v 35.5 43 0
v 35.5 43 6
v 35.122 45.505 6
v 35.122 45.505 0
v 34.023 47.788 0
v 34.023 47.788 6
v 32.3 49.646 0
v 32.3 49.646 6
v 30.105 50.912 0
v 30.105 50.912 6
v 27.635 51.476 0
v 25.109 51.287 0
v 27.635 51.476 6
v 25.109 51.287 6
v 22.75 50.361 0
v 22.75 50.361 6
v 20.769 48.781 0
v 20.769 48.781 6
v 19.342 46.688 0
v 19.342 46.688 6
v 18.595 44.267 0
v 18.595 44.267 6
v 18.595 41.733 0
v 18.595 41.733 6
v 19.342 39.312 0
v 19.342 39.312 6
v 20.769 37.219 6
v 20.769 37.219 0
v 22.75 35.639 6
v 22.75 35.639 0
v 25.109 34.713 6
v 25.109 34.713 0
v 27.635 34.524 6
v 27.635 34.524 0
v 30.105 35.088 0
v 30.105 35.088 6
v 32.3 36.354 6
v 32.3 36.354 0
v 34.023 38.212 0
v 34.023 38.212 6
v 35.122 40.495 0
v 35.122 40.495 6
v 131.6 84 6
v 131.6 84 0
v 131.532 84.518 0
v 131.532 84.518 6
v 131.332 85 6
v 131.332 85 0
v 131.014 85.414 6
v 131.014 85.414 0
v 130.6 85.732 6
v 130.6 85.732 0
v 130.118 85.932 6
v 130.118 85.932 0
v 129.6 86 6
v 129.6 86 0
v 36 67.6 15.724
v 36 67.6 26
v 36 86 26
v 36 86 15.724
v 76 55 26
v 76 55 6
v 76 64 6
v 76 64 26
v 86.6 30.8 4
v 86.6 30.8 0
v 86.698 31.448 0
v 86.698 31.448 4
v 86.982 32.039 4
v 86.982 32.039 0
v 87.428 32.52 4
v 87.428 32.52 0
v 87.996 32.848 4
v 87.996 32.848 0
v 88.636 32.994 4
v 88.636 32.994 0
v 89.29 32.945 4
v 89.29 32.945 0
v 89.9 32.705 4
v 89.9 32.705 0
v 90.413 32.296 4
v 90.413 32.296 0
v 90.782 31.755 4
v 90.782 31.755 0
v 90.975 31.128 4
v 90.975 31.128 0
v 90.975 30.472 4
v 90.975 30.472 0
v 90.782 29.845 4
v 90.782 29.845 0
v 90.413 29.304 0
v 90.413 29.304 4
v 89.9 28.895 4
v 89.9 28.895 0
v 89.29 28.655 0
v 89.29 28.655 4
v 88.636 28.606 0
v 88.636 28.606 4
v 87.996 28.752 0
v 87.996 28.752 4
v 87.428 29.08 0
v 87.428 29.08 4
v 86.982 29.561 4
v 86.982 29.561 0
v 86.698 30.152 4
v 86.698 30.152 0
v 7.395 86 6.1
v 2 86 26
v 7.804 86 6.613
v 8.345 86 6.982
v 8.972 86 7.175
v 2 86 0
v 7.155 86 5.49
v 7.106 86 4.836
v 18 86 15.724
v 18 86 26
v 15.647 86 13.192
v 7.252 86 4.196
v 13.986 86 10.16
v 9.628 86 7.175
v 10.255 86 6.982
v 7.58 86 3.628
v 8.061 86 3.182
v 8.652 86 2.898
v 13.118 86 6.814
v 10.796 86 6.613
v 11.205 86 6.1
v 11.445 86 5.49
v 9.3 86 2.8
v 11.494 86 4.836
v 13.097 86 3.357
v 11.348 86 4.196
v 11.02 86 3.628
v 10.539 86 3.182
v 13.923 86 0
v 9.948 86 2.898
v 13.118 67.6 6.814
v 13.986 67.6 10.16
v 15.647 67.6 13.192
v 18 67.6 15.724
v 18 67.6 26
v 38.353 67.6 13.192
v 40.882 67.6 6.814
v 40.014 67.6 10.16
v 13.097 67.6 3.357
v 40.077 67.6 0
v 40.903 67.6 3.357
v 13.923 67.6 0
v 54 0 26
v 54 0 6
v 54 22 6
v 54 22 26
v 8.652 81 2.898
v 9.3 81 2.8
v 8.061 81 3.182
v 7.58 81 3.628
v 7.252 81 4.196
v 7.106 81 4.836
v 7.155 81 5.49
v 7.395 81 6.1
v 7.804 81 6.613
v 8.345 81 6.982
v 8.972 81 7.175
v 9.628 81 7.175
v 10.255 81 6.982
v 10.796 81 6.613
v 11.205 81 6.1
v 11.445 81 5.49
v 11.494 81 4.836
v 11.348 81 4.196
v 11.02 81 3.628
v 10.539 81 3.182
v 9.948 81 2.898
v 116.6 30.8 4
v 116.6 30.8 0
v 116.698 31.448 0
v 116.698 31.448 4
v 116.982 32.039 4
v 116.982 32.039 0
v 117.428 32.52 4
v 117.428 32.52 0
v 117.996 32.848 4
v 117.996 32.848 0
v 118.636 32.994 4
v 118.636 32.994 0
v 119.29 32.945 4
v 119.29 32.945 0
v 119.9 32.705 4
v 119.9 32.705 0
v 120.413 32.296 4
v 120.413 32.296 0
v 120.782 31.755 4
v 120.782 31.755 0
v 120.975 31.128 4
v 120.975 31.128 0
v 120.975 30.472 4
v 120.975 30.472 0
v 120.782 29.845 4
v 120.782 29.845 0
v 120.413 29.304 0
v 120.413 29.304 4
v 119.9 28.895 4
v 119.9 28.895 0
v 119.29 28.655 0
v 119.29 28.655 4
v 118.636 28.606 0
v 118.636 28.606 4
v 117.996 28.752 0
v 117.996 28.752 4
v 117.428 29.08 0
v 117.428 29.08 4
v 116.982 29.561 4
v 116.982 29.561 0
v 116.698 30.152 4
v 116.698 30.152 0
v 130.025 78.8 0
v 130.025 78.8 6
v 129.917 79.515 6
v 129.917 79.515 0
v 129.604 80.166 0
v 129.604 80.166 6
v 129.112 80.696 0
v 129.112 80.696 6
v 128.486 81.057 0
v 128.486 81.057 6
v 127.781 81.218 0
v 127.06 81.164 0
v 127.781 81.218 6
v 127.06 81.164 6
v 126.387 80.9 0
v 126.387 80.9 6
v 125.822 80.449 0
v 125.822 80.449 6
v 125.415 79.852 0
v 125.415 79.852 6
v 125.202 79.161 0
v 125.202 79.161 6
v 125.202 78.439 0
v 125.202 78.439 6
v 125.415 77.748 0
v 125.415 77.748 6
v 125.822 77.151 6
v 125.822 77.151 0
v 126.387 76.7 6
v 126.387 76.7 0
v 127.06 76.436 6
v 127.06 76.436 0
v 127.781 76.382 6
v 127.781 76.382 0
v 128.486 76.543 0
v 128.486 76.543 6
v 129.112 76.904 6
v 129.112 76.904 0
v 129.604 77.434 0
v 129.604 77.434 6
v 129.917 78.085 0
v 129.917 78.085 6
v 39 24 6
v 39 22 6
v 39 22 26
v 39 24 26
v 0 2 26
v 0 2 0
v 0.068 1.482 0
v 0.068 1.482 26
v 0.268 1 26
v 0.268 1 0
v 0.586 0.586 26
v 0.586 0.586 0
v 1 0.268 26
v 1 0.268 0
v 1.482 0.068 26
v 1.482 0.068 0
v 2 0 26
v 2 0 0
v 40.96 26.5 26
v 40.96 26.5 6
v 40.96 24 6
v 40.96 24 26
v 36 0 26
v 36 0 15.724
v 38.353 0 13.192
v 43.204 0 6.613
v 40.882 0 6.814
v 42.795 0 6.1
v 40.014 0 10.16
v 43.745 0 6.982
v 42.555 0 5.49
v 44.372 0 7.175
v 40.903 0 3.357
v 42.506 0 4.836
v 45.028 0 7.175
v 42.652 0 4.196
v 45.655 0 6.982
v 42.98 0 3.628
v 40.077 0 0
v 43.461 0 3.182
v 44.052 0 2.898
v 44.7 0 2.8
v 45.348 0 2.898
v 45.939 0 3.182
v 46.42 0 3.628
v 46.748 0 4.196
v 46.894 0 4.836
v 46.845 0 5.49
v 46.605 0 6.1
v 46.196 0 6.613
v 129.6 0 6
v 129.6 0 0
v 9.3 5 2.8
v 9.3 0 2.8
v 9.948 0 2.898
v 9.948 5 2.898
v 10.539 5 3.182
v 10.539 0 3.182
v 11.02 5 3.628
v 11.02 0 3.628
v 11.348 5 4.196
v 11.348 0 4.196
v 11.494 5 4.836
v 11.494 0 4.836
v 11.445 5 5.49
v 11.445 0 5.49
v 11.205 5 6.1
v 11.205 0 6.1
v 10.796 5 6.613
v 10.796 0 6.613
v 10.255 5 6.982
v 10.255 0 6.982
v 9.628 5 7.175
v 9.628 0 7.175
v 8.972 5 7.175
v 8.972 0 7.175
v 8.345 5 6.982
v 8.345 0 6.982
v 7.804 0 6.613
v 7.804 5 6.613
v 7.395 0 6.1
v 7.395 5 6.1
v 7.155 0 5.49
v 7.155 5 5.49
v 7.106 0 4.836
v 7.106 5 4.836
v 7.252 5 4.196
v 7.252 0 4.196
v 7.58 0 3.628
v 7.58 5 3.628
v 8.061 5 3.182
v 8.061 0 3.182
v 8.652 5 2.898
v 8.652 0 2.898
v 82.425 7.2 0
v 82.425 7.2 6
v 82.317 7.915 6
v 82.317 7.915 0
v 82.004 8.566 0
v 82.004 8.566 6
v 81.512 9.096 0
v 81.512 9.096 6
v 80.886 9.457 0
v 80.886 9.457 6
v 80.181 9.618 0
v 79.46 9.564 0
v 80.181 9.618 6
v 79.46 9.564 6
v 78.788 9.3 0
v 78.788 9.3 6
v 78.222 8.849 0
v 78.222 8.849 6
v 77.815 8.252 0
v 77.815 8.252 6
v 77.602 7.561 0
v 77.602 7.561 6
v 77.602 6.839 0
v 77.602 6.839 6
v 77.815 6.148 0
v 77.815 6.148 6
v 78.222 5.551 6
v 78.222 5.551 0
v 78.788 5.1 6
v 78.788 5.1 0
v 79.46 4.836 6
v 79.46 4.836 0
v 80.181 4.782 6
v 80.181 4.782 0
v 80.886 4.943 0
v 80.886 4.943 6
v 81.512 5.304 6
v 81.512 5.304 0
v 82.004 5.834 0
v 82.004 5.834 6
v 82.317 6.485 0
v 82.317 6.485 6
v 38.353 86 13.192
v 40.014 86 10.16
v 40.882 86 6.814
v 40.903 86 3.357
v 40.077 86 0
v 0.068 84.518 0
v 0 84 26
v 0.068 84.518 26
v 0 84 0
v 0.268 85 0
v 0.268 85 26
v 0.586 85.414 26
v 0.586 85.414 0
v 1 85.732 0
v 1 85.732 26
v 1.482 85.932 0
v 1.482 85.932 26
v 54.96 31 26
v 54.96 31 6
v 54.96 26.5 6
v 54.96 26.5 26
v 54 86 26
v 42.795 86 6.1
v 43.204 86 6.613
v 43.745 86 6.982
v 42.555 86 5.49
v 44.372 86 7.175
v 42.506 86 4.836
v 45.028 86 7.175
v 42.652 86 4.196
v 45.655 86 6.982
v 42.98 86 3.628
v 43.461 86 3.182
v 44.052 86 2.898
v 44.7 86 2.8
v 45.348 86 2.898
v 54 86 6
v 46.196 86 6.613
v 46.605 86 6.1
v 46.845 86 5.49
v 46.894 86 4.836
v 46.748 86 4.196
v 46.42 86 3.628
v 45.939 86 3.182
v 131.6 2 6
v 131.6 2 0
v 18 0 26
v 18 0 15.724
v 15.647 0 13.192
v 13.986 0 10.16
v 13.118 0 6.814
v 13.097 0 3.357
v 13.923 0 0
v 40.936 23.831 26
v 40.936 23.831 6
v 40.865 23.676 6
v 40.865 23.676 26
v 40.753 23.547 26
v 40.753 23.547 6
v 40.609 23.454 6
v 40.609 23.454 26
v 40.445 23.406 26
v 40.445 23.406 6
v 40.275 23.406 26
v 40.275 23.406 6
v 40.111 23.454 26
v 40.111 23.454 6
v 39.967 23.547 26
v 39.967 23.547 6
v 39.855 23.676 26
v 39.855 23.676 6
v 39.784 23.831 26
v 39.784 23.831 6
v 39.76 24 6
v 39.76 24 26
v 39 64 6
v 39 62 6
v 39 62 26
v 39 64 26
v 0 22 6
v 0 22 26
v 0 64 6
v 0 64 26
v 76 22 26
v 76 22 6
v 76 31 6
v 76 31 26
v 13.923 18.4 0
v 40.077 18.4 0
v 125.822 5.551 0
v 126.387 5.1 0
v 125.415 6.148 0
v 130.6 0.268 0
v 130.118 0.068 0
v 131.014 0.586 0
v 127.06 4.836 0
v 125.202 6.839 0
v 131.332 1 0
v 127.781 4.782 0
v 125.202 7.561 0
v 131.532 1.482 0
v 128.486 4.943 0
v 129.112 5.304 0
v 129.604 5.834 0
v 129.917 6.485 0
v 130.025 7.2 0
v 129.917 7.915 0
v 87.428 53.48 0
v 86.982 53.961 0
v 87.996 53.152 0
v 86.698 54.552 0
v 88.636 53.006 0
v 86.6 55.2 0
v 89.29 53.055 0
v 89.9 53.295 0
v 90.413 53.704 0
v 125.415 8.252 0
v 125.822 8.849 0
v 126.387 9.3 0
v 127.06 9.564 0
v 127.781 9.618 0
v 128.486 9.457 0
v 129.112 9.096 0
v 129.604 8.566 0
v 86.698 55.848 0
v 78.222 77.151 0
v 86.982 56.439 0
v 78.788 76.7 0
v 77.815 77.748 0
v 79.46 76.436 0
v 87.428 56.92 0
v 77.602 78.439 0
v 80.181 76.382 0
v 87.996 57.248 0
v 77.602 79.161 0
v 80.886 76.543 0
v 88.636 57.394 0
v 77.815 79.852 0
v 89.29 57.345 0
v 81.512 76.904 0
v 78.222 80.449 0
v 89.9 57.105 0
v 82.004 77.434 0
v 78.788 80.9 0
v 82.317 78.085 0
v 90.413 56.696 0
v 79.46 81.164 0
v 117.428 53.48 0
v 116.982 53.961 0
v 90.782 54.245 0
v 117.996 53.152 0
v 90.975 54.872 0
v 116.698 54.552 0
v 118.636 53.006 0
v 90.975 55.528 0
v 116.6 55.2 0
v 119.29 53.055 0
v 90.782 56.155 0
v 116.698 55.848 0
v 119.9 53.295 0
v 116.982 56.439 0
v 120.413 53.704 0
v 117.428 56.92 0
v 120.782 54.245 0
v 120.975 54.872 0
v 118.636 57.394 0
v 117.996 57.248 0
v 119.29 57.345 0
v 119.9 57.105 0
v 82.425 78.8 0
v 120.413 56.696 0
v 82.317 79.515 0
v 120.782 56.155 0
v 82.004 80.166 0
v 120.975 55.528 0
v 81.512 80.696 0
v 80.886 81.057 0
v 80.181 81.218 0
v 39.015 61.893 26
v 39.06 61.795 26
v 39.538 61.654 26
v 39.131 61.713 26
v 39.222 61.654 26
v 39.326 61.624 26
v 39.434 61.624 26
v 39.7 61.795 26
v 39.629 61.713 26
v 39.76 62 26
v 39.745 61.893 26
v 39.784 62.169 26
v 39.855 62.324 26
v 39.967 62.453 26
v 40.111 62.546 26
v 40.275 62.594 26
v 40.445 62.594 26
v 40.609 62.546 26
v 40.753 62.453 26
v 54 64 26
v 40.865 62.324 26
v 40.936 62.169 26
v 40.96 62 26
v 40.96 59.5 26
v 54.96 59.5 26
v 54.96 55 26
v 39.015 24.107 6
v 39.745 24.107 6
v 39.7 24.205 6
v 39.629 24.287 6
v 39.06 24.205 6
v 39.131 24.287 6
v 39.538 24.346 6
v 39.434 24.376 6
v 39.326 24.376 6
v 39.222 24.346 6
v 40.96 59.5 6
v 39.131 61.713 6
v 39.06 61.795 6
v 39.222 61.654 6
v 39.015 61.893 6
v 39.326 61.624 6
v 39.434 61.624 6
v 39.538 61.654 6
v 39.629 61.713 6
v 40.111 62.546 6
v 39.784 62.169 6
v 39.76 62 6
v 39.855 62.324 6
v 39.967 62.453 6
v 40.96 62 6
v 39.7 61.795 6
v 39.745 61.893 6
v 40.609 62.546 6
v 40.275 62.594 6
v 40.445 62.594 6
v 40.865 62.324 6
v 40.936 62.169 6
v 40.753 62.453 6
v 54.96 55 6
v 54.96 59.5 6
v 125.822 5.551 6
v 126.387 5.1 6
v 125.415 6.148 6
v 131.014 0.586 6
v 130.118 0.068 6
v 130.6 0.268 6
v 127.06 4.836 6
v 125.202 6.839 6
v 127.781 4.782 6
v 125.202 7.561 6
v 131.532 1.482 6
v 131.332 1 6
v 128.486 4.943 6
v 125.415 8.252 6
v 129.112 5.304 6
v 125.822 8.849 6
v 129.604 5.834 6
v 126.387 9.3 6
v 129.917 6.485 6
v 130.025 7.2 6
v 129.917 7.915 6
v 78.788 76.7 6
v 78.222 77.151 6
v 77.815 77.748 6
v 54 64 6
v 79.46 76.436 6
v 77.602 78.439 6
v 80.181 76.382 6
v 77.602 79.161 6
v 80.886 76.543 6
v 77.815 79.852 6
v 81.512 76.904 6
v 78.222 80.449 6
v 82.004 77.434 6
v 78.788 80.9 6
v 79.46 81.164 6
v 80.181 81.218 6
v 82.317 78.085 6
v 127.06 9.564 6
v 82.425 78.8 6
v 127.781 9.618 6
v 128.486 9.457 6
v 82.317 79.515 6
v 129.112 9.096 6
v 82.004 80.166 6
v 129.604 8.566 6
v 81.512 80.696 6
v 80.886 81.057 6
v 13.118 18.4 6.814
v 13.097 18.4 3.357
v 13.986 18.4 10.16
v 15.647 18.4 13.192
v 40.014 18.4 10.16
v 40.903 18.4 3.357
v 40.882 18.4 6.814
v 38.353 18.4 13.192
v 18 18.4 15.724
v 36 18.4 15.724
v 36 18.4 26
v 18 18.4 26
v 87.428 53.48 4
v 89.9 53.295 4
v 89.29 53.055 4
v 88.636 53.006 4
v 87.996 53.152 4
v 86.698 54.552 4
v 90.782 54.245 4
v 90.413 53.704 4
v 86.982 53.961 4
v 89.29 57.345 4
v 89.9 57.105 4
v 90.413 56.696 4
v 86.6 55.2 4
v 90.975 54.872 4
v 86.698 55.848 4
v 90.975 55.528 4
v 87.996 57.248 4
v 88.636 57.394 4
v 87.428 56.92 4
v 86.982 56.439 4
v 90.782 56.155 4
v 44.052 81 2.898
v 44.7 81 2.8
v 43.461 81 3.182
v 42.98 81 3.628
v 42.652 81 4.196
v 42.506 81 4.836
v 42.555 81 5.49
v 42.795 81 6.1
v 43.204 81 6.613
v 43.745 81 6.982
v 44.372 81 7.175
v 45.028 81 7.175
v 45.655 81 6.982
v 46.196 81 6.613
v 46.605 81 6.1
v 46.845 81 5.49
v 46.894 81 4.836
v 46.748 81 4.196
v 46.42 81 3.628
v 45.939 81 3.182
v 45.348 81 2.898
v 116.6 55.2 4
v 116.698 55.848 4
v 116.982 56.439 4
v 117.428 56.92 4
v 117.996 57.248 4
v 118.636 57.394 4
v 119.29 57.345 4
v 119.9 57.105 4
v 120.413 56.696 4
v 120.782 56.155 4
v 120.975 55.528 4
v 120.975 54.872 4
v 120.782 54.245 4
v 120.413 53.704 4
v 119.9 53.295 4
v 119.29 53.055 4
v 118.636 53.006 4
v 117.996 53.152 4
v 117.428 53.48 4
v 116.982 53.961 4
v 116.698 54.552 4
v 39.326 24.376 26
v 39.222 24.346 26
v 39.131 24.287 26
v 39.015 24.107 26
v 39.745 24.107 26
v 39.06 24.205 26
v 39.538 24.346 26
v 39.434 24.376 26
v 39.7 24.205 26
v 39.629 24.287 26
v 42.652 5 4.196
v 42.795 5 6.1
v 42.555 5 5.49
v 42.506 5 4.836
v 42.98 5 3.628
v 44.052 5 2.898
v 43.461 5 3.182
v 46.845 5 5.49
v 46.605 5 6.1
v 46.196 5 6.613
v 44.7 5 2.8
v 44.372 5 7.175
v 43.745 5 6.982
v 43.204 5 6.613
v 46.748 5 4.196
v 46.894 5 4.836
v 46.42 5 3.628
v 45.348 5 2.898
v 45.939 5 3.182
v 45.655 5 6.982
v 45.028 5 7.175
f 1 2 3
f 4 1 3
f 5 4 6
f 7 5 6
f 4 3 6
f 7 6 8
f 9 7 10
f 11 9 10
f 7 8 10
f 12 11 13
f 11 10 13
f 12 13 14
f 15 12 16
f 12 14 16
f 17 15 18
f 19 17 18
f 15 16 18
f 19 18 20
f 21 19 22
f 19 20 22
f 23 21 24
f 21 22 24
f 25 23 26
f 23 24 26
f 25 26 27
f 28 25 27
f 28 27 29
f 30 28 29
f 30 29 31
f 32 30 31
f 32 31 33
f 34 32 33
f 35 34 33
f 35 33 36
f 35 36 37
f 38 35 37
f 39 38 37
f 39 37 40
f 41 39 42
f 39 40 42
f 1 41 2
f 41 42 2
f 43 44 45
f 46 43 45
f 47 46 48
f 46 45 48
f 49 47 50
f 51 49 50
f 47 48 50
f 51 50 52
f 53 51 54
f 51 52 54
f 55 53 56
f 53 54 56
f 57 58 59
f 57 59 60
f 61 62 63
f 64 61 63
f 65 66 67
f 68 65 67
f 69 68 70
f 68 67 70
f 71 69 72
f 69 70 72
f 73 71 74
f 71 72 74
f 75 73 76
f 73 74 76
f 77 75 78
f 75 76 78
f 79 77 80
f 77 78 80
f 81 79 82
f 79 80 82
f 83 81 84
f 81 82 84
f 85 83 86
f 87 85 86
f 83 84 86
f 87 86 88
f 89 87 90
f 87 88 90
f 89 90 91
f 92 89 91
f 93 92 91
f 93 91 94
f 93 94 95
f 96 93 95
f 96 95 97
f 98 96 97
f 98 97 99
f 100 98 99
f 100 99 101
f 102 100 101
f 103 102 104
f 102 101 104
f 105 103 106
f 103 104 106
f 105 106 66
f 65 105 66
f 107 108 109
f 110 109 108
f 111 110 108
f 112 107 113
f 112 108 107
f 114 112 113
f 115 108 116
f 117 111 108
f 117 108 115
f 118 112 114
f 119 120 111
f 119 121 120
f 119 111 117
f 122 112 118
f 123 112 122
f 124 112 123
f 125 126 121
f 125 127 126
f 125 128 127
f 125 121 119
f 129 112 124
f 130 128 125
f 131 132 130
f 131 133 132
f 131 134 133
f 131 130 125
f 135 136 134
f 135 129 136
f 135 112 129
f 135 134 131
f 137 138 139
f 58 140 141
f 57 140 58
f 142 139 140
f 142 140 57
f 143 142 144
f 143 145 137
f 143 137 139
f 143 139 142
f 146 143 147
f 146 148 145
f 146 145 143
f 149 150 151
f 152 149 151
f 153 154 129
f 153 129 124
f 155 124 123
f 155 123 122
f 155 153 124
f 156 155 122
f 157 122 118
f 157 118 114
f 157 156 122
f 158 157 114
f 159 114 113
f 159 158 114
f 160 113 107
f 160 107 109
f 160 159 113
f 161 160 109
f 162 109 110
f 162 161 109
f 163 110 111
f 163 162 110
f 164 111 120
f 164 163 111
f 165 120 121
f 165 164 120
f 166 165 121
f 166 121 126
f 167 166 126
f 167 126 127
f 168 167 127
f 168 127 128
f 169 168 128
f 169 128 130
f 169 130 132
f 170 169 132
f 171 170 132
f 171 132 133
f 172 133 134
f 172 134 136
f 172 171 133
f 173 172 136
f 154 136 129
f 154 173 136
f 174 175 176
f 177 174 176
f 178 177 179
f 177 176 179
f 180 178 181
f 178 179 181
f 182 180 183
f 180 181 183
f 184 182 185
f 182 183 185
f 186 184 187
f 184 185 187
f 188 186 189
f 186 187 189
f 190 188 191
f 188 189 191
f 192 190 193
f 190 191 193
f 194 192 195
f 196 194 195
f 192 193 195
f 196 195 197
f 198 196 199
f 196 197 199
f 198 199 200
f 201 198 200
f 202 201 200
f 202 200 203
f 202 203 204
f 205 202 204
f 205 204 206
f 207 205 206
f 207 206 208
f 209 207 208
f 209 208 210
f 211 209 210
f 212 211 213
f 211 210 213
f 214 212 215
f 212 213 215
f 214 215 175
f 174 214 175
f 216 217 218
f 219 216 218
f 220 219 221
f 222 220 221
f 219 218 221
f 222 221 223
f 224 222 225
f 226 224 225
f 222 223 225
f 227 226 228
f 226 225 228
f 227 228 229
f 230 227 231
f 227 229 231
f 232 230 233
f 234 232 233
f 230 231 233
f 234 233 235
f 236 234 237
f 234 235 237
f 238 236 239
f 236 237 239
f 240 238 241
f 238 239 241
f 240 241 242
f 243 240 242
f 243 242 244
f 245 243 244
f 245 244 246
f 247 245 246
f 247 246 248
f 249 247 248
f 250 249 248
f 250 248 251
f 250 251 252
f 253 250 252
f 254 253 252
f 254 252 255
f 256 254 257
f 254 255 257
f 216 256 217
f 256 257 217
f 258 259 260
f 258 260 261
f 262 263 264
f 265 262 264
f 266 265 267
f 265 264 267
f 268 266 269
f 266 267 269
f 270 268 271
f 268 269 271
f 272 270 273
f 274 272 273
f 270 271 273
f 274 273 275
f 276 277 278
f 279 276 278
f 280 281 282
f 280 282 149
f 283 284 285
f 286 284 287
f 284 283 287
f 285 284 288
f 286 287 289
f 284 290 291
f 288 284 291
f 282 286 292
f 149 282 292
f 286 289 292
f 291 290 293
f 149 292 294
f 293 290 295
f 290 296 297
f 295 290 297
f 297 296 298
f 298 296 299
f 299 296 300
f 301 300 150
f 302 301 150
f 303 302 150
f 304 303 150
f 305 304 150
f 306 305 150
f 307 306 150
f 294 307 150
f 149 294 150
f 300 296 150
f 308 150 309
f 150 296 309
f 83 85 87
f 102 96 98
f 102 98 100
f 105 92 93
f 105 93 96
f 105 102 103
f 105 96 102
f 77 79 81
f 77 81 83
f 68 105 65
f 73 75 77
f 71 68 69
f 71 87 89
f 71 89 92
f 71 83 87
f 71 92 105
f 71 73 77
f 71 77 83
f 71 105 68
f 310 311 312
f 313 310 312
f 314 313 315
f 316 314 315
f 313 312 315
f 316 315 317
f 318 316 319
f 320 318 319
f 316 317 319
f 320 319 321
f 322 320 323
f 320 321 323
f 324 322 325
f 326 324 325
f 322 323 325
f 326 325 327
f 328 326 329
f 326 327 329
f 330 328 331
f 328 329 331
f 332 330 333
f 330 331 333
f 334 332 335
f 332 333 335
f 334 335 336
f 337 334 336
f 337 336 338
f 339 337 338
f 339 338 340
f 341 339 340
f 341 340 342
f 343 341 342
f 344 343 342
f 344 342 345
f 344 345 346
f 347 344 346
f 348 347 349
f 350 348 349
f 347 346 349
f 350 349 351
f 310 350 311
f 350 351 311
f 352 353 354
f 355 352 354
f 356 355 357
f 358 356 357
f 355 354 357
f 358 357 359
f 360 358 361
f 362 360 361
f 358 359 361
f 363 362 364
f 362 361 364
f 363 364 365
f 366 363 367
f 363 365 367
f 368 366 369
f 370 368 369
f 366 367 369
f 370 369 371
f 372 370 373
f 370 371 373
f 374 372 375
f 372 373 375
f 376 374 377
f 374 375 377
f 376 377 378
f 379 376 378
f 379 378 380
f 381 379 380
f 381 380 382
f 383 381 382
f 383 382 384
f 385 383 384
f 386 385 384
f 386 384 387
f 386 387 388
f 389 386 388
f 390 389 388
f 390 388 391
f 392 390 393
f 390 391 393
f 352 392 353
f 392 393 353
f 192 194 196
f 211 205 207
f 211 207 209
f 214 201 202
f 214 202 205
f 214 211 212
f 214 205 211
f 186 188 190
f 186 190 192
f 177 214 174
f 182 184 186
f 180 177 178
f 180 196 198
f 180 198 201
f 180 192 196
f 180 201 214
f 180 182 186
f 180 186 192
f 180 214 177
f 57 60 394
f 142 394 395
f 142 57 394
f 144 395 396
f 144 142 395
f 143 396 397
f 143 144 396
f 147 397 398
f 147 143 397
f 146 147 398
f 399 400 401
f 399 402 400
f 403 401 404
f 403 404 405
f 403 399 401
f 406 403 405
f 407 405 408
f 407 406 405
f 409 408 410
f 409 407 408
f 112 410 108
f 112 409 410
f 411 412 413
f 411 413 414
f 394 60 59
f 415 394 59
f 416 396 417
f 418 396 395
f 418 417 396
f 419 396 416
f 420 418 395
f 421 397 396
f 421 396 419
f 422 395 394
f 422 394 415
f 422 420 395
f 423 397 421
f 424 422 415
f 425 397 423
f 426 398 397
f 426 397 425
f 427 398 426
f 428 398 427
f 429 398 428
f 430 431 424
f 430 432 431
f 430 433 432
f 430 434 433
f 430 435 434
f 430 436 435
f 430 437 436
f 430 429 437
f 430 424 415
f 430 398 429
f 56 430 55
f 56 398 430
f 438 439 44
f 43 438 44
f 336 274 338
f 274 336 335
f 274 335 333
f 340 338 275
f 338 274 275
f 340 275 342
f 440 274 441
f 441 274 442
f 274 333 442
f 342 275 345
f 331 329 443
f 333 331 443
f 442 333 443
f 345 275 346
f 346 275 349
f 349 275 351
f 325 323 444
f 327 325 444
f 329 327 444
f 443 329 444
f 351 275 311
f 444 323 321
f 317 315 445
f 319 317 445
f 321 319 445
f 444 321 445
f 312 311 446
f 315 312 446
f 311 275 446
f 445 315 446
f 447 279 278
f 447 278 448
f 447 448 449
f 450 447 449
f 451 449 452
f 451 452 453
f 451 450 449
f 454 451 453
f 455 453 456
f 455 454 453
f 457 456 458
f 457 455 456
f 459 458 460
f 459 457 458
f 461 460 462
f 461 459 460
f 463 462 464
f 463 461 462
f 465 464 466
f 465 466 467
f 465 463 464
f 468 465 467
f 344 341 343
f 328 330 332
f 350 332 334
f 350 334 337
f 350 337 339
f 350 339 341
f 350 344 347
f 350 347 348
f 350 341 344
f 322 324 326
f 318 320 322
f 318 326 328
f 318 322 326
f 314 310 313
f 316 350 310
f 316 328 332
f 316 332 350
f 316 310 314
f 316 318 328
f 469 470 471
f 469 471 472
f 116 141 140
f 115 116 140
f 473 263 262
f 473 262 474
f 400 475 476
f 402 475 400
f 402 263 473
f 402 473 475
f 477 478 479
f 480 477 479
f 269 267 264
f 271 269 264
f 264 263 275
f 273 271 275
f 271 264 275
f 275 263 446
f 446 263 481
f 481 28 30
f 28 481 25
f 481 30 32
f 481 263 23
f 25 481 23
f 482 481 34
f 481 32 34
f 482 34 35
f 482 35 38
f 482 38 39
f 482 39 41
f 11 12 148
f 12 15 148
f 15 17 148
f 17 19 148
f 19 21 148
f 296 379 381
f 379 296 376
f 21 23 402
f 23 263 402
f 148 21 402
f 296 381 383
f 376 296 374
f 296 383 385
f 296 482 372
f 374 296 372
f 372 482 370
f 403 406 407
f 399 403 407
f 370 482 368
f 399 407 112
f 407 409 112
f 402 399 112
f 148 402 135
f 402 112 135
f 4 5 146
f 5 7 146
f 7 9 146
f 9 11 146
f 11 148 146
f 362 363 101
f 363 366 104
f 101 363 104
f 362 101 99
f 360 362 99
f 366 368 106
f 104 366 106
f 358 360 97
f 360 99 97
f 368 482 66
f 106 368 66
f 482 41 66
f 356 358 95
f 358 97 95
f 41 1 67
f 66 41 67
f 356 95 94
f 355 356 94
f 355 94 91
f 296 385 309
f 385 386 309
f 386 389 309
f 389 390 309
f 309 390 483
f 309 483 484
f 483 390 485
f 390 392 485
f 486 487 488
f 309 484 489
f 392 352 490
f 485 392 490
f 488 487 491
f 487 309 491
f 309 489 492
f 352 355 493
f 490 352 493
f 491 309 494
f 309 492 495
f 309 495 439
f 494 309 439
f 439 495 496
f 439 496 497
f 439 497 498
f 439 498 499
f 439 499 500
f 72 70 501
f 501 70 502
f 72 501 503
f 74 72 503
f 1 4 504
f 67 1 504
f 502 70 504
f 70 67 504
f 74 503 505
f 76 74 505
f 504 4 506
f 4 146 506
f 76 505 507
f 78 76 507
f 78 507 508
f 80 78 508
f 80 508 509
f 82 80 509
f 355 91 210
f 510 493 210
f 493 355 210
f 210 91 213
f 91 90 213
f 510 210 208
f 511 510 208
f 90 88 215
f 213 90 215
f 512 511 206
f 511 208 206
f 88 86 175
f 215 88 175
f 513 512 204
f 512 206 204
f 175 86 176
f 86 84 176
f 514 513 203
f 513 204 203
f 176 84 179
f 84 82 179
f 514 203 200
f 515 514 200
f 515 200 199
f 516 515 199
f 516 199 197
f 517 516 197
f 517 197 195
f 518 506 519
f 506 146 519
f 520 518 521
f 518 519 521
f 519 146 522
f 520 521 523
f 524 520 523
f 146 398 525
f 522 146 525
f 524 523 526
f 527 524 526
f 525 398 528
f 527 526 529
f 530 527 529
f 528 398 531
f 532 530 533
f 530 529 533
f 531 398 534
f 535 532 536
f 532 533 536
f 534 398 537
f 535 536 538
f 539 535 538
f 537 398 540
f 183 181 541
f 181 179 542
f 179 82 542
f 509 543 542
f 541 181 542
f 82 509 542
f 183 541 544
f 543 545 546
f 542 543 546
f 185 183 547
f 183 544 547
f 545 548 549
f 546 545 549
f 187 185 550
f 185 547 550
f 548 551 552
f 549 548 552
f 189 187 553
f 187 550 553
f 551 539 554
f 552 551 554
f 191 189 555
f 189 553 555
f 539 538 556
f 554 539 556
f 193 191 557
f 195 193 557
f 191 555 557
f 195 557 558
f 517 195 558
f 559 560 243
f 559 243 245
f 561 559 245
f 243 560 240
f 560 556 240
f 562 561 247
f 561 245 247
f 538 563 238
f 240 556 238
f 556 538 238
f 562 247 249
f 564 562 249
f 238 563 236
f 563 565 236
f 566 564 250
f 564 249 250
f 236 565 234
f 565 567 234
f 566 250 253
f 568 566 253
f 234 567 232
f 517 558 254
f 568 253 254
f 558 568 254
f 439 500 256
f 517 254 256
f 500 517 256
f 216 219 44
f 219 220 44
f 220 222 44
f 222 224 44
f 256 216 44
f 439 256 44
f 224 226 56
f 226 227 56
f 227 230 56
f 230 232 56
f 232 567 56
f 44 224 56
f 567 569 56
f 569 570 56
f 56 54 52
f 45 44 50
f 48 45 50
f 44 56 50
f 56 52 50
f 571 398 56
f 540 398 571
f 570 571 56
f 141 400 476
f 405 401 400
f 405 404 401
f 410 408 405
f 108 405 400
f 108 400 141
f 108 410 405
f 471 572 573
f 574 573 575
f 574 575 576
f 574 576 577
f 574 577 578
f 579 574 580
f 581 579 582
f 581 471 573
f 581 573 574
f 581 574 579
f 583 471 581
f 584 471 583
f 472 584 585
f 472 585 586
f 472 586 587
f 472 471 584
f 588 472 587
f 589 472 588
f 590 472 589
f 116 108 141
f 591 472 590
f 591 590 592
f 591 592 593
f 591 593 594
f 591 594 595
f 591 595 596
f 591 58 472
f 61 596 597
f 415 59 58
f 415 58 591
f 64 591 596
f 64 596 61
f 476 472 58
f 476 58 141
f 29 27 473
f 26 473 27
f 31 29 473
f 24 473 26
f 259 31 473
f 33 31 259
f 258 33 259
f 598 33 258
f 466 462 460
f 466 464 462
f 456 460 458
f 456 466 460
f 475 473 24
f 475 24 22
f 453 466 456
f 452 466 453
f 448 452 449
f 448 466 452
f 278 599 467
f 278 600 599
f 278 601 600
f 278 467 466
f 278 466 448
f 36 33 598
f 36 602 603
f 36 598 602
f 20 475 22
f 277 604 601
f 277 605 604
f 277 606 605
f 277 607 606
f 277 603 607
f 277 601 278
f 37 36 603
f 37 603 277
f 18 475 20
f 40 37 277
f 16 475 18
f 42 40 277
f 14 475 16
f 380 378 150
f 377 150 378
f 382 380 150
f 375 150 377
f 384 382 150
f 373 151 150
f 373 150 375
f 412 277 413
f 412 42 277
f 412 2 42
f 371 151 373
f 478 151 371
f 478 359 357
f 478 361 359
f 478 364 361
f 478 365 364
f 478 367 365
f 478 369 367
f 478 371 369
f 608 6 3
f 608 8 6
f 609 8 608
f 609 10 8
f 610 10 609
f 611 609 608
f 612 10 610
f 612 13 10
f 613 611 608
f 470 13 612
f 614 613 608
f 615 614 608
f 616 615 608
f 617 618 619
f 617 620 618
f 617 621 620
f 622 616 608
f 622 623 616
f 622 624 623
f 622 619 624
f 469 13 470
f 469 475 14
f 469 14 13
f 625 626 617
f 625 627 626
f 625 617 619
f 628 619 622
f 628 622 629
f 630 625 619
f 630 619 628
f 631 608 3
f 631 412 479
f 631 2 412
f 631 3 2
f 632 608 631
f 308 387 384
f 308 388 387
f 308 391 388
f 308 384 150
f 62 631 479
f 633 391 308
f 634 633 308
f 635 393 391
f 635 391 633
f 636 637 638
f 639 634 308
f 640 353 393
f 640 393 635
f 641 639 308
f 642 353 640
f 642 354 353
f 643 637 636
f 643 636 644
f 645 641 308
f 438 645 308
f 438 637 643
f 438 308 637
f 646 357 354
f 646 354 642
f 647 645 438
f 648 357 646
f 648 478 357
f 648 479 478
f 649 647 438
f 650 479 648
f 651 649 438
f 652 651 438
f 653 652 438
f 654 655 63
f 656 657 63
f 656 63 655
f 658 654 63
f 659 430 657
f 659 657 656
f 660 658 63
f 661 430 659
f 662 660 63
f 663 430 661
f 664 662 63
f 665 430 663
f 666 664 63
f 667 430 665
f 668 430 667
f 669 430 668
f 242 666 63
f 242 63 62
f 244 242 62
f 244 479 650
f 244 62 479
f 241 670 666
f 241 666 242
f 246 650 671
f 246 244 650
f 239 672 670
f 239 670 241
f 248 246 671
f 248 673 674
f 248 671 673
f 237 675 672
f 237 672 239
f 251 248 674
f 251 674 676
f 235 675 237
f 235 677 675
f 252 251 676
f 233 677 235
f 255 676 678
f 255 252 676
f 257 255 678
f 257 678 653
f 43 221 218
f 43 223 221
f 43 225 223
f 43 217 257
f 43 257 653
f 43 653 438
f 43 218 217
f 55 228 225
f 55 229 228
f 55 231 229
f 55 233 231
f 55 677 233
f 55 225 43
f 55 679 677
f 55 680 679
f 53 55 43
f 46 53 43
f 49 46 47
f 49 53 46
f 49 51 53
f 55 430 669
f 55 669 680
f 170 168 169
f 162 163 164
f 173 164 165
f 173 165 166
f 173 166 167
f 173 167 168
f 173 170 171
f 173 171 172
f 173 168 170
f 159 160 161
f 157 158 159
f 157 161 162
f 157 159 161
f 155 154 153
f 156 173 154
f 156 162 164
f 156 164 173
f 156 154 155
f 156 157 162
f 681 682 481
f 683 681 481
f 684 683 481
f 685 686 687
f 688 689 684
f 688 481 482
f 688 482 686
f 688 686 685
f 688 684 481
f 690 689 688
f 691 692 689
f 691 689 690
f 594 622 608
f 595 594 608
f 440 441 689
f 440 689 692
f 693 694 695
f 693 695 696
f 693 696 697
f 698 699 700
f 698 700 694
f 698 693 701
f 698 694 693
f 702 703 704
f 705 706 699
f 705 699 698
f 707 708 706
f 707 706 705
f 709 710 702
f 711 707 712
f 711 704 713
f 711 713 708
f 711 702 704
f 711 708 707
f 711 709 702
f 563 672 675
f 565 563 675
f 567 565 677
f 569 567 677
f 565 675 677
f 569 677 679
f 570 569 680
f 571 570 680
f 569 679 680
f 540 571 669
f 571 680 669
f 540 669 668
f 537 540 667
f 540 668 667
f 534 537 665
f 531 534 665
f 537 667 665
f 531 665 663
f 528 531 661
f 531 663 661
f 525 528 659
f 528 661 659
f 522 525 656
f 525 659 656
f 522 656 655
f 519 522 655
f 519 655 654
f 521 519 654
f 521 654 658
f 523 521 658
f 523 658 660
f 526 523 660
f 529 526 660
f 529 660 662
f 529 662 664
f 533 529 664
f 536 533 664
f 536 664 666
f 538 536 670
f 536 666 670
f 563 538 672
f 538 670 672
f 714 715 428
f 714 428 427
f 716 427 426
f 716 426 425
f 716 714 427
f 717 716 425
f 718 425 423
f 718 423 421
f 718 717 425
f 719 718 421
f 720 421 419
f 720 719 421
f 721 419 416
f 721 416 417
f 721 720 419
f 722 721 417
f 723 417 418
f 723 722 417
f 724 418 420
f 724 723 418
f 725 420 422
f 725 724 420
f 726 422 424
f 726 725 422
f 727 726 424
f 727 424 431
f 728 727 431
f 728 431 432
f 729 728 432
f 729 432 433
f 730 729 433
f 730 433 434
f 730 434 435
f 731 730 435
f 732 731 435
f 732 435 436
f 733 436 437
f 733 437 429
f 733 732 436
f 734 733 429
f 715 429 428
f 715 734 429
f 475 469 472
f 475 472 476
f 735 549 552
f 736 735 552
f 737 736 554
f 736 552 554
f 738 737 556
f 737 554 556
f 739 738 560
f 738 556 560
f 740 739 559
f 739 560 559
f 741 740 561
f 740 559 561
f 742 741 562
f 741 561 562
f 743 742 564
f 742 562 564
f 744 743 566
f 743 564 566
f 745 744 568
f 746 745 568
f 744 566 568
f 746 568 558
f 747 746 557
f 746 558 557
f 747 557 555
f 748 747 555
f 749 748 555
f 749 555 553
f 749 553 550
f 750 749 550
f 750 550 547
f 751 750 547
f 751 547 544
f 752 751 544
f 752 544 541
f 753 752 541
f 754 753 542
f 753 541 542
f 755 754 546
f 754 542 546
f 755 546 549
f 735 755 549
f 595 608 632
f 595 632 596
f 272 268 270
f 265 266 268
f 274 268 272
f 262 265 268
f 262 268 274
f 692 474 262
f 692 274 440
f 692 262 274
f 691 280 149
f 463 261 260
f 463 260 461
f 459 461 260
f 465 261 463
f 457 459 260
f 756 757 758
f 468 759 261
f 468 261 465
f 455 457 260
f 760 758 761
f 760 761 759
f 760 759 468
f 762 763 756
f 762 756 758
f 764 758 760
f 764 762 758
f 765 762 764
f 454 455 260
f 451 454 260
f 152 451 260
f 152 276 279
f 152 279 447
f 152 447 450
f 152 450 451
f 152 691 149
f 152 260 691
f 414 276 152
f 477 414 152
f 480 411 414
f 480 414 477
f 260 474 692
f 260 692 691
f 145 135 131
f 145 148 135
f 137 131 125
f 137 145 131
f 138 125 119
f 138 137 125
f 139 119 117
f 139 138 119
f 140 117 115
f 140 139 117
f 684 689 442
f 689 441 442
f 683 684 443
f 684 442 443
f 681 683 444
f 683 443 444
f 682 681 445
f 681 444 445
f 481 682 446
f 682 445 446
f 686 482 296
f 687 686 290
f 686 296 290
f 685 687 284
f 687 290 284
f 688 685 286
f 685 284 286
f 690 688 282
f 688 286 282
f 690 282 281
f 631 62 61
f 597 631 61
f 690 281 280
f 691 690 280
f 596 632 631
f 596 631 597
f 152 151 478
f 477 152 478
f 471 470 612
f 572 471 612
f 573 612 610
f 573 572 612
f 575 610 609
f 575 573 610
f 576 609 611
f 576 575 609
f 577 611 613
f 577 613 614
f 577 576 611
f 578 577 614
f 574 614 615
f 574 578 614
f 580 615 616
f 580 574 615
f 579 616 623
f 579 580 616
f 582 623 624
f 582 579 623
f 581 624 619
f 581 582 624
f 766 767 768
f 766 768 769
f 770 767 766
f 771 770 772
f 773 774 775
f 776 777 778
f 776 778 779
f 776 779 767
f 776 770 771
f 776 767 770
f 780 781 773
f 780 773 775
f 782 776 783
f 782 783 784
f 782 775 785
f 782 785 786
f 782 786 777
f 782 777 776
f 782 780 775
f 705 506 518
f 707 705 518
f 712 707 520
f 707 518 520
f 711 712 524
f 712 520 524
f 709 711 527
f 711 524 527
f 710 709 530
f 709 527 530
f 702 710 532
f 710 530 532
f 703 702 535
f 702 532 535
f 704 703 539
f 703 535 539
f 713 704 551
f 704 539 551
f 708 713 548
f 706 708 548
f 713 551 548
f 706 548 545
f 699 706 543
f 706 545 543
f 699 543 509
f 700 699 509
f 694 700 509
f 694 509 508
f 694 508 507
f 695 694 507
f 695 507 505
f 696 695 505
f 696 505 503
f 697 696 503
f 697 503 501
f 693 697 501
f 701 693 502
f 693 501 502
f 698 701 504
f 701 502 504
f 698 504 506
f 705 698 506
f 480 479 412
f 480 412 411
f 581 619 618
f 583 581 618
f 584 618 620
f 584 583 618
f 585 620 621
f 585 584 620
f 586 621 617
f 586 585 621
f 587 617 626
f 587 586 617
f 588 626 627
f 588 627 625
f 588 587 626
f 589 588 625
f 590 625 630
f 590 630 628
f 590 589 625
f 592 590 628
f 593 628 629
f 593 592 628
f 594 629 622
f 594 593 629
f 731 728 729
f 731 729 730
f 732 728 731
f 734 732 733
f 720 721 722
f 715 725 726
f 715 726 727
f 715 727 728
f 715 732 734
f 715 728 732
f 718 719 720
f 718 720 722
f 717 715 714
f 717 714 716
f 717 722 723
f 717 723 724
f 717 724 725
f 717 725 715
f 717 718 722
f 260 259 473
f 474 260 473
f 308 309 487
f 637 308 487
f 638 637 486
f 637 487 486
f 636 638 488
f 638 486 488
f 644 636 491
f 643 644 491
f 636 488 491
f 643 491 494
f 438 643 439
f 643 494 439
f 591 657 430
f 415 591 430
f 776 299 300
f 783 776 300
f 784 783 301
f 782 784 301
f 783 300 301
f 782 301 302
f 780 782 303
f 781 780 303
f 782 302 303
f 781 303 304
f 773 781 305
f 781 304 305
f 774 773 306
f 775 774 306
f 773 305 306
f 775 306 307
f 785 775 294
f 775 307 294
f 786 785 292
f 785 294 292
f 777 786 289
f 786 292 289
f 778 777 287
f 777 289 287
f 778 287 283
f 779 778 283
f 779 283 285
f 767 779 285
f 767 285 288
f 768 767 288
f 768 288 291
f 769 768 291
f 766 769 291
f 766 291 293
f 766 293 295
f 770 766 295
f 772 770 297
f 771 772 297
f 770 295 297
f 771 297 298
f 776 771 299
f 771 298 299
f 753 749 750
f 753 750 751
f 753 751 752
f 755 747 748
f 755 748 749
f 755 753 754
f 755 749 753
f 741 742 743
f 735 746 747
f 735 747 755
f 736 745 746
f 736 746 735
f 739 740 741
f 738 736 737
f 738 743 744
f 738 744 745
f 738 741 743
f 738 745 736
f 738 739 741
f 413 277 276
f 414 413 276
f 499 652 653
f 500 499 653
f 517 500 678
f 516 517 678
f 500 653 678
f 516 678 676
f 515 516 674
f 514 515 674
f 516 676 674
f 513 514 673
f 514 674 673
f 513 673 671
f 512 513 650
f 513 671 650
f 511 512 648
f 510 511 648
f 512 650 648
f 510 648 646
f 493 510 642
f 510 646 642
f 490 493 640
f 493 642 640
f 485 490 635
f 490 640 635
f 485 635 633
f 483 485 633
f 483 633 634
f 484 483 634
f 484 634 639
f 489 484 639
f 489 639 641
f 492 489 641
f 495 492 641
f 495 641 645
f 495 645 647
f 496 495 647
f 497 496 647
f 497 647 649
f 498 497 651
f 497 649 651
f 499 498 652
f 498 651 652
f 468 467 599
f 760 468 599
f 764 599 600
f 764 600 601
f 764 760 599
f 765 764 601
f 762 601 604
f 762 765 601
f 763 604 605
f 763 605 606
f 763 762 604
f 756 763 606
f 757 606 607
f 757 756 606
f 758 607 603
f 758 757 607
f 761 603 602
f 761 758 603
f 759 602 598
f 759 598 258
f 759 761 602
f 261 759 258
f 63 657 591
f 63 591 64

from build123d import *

# Parameters (mm, degrees)
P_IDAT_VYSUNUT_M1_DEPTH   = 6
SKICA3_R                  = 8.5
SKICA3_R_2                = 2.425
ODEBRAT_VYSUNUT_M1_DEPTH  = 6
P_IDAT_VYSUNUT_M3_DEPTH   = 20
SKICA6_R                  = 14
ODEBRAT_VYSUNUT_M2_DEPTH  = 18.4
ODEBRAT_START             = -18.4
SKICA10_R                 = 14
ODEBRAT_VYSUNUT_M3_DEPTH  = 18.4
SKICA18_W                 = 15
SKICA18_H                 = 42
P_IDAT_VYSUNUT_M5_DEPTH   = 20
ODEBRAT_VYSUNUT_M9_DEPTH  = 20
SKICA14_R                 = 2.2
ODEBRAT_VYSUNUT_M7_DEPTH  = 5
ODEBRAT_START_2           = -5
SKICA15_R                 = 2.2
ODEBRAT_VYSUNUT_M8_DEPTH  = 5
SKICA23_R                 = 2.2
ODEBRAT_VYSUNUT_M10_DEPTH = 4
SKICA24_W                 = 18
SKICA24_H                 = 10.276194705
ODEBRAT_VYSUNUT_M12_DEPTH = 18.4
SKICA31_W                 = 22
SKICA31_H                 = 42
P_IDAT_VYSUNUT_M6_DEPTH   = 20
SKICA25_W                 = 18
SKICA25_H                 = 10.276194705
ODEBRAT_VYSUNUT_M13_DEPTH = 18.4
SKICA26_W                 = 20
SKICA26_H                 = 24
ODEBRAT_VYSUNUT_M14_DEPTH = 36.4
SKICA27_W                 = 20
SKICA27_H                 = 33
ODEBRAT_VYSUNUT_M15_DEPTH = 14


with BuildPart() as part:
    # Skica2 → Přidat vysunutím1 (new body)
    with BuildSketch(Plane.XY):
        with BuildLine():
            Line((2, 0), (129.6, 0))
            ThreePointArc((129.6, 0), (131.014213562, 0.585786438), (131.6, 2))
            Line((131.6, 2), (131.6, 84))
            ThreePointArc((131.6, 84), (131.014213562, 85.414213562), (129.6, 86))
            Line((129.6, 86), (2, 86))
            ThreePointArc((2, 86), (0.585786438, 85.414213562), (0, 84))
            Line((0, 84), (0, 2))
            ThreePointArc((0, 2), (0.585786438, 0.585786438), (2, 0))
        make_face()
    extrude(amount=P_IDAT_VYSUNUT_M1_DEPTH)

    # Skica3 → Odebrat vysunutím1 (cut)
    with BuildSketch(Plane.XY.offset(6)):
        with Locations((27, 43)):
            Circle(SKICA3_R)
        with Locations((127.6, 78.8)):
            Circle(SKICA3_R_2)
        with Locations((80, 7.2)):
            Circle(SKICA3_R_2)
        with Locations((127.6, 7.2)):
            Circle(SKICA3_R_2)
        with Locations((80, 78.8)):
            Circle(SKICA3_R_2)
    extrude(amount=-ODEBRAT_VYSUNUT_M1_DEPTH, mode=Mode.SUBTRACT)

    # Skica4 → Přidat vysunutím3 (add)
    with BuildSketch(Plane.XY.offset(6)):
        with BuildLine():
            Line((2, 86), (54, 86))
            Line((54, 86), (54, 64))
            Line((54, 64), (0, 64))
            Line((0, 64), (0, 84))
            ThreePointArc((0, 84), (0.585786438, 85.414213562), (2, 86))
        make_face()
        with BuildLine():
            Line((2, 0), (54, 0))
            Line((54, 0), (54, 22))
            Line((54, 22), (0, 22))
            Line((0, 22), (0, 2))
            ThreePointArc((0, 2), (0.585786438, 0.585786438), (2, 0))
        make_face()
    extrude(amount=P_IDAT_VYSUNUT_M3_DEPTH)

    # Skica6 → Odebrat vysunutím2 (cut)
    with BuildSketch(Plane.XZ):
        with Locations((27, 5)):
            Circle(SKICA6_R)
    extrude(amount=-ODEBRAT_VYSUNUT_M2_DEPTH, mode=Mode.SUBTRACT)

    # Skica10 → Odebrat vysunutím3 (cut)
    with BuildSketch(Plane(origin=(0, 86, 0), x_dir=(1, 0, 0), z_dir=(0, 1, 0)).offset(ODEBRAT_START)):
        with Locations((27, -5)):
            Circle(SKICA10_R)
    extrude(amount=ODEBRAT_VYSUNUT_M3_DEPTH, mode=Mode.SUBTRACT)

    # Skica18 → Přidat vysunutím5 (add)
    with BuildSketch(Plane.XY.offset(6)):
        with Locations((46.5, 43)):
            Rectangle(SKICA18_W, SKICA18_H)
    extrude(amount=P_IDAT_VYSUNUT_M5_DEPTH)

    # Skica21 → Odebrat vysunutím9 (cut)
    with BuildSketch(Plane.XY.offset(26)):
        with BuildLine():
            Line((39, 24), (39, 62))
            ThreePointArc((39, 62), (39.38, 61.620000112), (39.76, 62))
            ThreePointArc((39.76, 62), (40.36, 62.599999823), (40.96, 62))
            Line((40.96, 62), (40.96, 24))
            ThreePointArc((40.96, 24), (40.36, 23.4), (39.76, 24))
            ThreePointArc((39.76, 24), (39.38, 24.38), (39, 24))
        make_face()
    extrude(amount=-ODEBRAT_VYSUNUT_M9_DEPTH, mode=Mode.SUBTRACT)

    # Skica14 → Odebrat vysunutím7 (cut)
    with BuildSketch(Plane.XZ):
        with Locations(Location((9.3, 5, 0), (0, 0, 270))):
            Circle(SKICA14_R)
        with Locations(Location((44.7, 5, 0), (0, 0, 270))):
            Circle(SKICA14_R)
    extrude(amount=-ODEBRAT_VYSUNUT_M7_DEPTH, mode=Mode.SUBTRACT)

    # Skica15 → Odebrat vysunutím8 (cut)
    with BuildSketch(Plane(origin=(0, 86, 0), x_dir=(1, 0, 0), z_dir=(0, 1, 0)).offset(ODEBRAT_START_2)):
        with Locations(Location((9.3, -5, 0), (0, 0, 90))):
            Circle(SKICA15_R)
        with Locations(Location((44.7, -5, 0), (0, 0, 90))):
            Circle(SKICA15_R)
    extrude(amount=ODEBRAT_VYSUNUT_M8_DEPTH, mode=Mode.SUBTRACT)

    # Skica23 → Odebrat vysunutím10 (cut)
    with BuildSketch(Plane(origin=(0, 0, 0), x_dir=(-1, 0, 0), z_dir=(0, 0, -1))):
        with Locations((-118.8, 55.2)):
            Circle(SKICA23_R)
        with Locations((-88.8, 55.2)):
            Circle(SKICA23_R)
        with Locations((-88.8, 30.8)):
            Circle(SKICA23_R)
        with Locations((-118.8, 30.8)):
            Circle(SKICA23_R)
    extrude(amount=-ODEBRAT_VYSUNUT_M10_DEPTH, mode=Mode.SUBTRACT)

    # Skica24 → Odebrat vysunutím12 (cut)
    with BuildSketch(Plane(origin=(0, 86, 0), x_dir=(1, 0, 0), z_dir=(0, 1, 0))):
        with Locations((27, -20.861902648)):
            Rectangle(SKICA24_W, SKICA24_H)
    extrude(amount=-ODEBRAT_VYSUNUT_M12_DEPTH, mode=Mode.SUBTRACT)

    # Skica31 → Přidat vysunutím6 (add)
    with BuildSketch(Plane.XY.offset(6)):
        with Locations((65, 43)):
            Rectangle(SKICA31_W, SKICA31_H)
    extrude(amount=P_IDAT_VYSUNUT_M6_DEPTH)

    # Skica25 → Odebrat vysunutím13 (cut)
    with BuildSketch(Plane.XZ):
        with Locations((27, 20.861902648)):
            Rectangle(SKICA25_W, SKICA25_H)
    extrude(amount=-ODEBRAT_VYSUNUT_M13_DEPTH, mode=Mode.SUBTRACT)

    # Skica26 → Odebrat vysunutím14 (cut)
    with BuildSketch(Plane.ZY.offset(-40.96)):
        with Locations((16, 43)):
            Rectangle(SKICA26_W, SKICA26_H)
    extrude(amount=-ODEBRAT_VYSUNUT_M14_DEPTH, mode=Mode.SUBTRACT)

    # Skica27 → Odebrat vysunutím15 (cut)
    with BuildSketch(Plane.ZY.offset(-40.96)):
        with Locations((16, 43)):
            Rectangle(SKICA27_W, SKICA27_H)
    extrude(amount=-ODEBRAT_VYSUNUT_M15_DEPTH, mode=Mode.SUBTRACT)


solid = part.part
